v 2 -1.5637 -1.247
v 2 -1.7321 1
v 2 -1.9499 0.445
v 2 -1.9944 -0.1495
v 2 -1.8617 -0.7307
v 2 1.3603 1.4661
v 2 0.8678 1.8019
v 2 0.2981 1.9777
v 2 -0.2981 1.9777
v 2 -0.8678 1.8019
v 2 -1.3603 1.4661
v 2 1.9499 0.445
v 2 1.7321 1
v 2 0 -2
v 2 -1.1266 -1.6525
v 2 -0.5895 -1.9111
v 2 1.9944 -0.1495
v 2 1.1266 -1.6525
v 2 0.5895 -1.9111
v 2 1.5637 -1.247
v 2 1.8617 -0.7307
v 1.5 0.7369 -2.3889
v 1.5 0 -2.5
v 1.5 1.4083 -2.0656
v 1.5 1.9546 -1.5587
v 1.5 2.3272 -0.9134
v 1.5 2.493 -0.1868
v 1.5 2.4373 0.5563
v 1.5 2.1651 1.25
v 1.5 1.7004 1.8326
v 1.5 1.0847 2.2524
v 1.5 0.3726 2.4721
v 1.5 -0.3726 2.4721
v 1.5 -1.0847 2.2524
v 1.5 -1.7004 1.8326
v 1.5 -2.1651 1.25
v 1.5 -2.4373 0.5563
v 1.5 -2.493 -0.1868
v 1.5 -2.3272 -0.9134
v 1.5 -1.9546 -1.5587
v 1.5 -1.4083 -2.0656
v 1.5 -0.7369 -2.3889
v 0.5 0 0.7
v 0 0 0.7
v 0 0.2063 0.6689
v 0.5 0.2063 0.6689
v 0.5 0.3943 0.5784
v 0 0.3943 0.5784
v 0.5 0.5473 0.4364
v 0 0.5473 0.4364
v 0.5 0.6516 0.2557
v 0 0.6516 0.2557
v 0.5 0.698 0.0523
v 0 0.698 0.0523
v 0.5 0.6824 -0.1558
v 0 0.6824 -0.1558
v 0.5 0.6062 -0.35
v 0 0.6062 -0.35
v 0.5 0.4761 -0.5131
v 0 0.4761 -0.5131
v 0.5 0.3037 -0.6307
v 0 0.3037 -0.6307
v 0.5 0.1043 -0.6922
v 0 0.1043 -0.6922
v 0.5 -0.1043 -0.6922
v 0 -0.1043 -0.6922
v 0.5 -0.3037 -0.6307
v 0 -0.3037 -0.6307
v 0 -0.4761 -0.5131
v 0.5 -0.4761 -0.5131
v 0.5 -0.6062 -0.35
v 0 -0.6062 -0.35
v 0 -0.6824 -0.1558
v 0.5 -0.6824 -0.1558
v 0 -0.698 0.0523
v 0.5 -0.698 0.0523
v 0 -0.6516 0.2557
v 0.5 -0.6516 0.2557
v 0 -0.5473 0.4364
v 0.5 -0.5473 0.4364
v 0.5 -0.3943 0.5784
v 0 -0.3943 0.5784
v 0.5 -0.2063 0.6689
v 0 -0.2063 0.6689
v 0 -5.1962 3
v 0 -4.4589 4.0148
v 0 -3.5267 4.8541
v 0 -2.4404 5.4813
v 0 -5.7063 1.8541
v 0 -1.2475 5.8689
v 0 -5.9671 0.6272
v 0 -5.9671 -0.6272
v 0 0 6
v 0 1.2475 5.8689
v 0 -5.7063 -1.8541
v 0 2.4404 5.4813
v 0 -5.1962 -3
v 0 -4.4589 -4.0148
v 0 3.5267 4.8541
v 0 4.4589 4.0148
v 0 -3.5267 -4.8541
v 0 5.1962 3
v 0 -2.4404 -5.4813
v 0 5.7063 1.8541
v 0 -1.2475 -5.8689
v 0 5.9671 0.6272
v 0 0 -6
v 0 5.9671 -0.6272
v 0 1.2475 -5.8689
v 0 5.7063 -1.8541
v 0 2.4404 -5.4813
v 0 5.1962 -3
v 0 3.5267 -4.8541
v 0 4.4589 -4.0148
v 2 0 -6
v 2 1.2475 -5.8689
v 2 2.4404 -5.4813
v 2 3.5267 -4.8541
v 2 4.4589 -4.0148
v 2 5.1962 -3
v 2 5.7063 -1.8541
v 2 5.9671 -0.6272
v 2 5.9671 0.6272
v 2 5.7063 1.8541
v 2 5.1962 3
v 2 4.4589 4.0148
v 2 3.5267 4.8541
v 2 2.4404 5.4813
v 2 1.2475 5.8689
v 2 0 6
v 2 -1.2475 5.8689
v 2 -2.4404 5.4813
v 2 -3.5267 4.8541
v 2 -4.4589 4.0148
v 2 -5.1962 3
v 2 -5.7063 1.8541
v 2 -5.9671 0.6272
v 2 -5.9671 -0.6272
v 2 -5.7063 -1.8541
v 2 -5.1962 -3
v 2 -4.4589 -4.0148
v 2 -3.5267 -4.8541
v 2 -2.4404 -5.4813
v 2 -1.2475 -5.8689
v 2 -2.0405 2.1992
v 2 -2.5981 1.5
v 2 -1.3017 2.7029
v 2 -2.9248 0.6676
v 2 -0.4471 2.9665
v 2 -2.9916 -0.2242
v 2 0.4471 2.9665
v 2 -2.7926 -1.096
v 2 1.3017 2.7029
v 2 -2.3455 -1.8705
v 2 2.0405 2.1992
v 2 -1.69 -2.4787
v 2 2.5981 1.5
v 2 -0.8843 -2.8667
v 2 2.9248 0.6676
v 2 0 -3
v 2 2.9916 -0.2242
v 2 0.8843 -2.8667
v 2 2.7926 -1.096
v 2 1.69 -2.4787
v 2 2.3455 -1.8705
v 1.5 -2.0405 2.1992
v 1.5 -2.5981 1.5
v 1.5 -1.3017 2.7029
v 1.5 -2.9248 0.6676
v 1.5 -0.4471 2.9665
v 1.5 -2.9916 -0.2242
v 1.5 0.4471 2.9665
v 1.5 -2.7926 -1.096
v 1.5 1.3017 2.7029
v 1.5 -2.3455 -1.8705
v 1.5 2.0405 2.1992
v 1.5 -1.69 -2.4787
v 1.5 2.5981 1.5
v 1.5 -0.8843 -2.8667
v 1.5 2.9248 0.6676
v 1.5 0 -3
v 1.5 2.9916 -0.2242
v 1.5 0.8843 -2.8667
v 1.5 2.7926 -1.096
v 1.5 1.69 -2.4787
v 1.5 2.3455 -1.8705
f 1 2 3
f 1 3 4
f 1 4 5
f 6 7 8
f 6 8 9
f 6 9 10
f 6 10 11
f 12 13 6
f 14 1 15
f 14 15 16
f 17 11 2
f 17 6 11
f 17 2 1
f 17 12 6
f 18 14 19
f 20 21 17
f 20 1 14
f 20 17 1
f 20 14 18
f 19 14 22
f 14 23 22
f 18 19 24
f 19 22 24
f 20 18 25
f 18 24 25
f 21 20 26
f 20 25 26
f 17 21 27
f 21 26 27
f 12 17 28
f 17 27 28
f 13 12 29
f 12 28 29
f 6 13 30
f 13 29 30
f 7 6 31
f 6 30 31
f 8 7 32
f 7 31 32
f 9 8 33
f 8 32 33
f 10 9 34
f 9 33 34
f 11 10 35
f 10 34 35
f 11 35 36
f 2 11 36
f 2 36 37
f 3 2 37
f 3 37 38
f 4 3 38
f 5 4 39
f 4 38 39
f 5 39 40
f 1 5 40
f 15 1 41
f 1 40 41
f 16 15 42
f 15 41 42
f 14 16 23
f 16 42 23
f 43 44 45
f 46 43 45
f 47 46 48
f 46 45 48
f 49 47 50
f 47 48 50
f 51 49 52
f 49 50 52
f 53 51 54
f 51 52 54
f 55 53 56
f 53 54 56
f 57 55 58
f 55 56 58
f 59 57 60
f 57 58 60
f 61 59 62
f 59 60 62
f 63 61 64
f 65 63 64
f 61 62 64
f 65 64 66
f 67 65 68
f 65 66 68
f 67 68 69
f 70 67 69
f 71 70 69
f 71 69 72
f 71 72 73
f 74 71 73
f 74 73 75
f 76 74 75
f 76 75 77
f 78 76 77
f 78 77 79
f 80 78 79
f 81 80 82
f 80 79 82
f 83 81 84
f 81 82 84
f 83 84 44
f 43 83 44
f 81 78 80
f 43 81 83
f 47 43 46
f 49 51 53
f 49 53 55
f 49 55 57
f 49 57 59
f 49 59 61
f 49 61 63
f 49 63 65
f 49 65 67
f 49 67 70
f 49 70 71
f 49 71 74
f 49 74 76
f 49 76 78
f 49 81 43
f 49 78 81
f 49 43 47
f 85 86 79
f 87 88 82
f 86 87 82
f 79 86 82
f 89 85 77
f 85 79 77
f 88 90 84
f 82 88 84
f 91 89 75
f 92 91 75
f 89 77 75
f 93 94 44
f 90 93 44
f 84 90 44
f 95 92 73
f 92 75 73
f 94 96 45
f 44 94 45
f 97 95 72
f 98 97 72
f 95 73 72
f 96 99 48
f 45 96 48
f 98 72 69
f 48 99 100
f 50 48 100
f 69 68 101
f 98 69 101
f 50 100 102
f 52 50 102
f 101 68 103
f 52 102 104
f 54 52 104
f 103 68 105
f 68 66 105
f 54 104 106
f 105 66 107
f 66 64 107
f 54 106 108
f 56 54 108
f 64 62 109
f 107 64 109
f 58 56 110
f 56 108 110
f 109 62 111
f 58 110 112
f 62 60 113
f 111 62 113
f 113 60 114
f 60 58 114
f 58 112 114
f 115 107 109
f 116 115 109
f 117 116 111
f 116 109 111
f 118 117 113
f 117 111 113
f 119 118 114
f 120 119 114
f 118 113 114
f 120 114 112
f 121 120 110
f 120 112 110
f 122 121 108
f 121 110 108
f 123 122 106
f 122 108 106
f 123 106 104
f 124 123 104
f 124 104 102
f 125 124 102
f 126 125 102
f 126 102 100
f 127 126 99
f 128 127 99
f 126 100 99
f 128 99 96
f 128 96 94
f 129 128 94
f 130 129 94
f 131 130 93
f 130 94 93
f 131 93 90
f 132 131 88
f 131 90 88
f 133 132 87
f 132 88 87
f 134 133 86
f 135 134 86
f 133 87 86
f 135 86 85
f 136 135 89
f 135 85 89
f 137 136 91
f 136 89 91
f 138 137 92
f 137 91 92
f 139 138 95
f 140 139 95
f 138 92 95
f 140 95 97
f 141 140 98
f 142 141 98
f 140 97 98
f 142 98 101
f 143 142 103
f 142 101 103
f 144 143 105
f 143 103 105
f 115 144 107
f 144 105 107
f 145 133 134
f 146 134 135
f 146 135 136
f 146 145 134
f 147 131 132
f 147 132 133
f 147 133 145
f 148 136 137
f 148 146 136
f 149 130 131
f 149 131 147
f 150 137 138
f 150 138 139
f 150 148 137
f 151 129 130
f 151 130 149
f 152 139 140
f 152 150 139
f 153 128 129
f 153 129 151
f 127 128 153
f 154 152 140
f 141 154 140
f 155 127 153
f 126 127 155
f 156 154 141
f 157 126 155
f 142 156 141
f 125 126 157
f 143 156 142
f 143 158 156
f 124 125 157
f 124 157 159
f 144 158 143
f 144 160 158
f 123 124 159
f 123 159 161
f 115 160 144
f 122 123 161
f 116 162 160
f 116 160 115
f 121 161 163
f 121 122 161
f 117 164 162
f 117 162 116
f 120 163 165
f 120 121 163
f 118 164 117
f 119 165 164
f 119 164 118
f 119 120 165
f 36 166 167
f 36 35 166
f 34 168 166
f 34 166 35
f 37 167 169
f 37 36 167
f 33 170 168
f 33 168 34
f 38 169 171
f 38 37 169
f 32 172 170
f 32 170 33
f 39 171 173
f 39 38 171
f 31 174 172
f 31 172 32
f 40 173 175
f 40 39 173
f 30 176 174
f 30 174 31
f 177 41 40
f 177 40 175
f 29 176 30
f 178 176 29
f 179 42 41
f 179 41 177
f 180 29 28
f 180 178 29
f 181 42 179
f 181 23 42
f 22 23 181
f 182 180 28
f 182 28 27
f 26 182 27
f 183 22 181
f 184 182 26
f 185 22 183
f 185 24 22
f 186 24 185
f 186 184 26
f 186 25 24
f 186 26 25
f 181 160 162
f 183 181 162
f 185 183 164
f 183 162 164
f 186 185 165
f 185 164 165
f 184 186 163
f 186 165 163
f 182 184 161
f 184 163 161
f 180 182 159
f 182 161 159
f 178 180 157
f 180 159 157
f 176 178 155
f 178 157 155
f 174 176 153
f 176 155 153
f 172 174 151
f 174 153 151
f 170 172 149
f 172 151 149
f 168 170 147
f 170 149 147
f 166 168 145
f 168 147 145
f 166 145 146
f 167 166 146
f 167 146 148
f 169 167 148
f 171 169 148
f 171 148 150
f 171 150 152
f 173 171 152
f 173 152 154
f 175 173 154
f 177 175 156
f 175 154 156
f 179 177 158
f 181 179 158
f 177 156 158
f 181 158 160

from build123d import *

# Parameters (mm, degrees)
SKETCH1_R           = 6
BOSS_EXTRUDE1_DEPTH = 2
SKETCH2_R           = 0.7
CUT_EXTRUDE1_DEPTH  = 0.5
SKETCH3_R           = 3
CUT_EXTRUDE2_DEPTH  = 0.5
SKETCH5_R           = 2
SKETCH4_R           = 2.5


with BuildPart() as part:
    # Sketch1 → Boss-Extrude1 (new body)
    with BuildSketch(Plane(origin=(0, 0, 0), x_dir=(0, 0, -1), z_dir=(1, 0, 0))):
        Circle(SKETCH1_R)
    extrude(amount=BOSS_EXTRUDE1_DEPTH)

    # Sketch2 → Cut-Extrude1 (cut)
    with BuildSketch(Plane.ZY):
        Circle(SKETCH2_R)
    extrude(amount=-CUT_EXTRUDE1_DEPTH, mode=Mode.SUBTRACT)

    # Sketch3 → Cut-Extrude2 (cut)
    with BuildSketch(Plane(origin=(2, 0, 0), x_dir=(0, 0, -1), z_dir=(1, 0, 0))):
        Circle(SKETCH3_R)
    extrude(amount=-CUT_EXTRUDE2_DEPTH, mode=Mode.SUBTRACT)

    # Sketch5 → Loft1 section 0
    with BuildSketch(Plane(origin=(2, 0, 0), x_dir=(0, 0, -1), z_dir=(1, 0, 0))):
        Circle(SKETCH5_R)
    # Sketch4 → Loft1 section 1
    with BuildSketch(Plane(origin=(1.5, 0, 0), x_dir=(0, 0, -1), z_dir=(1, 0, 0))):
        Circle(SKETCH4_R)
    loft()


solid = part.part
